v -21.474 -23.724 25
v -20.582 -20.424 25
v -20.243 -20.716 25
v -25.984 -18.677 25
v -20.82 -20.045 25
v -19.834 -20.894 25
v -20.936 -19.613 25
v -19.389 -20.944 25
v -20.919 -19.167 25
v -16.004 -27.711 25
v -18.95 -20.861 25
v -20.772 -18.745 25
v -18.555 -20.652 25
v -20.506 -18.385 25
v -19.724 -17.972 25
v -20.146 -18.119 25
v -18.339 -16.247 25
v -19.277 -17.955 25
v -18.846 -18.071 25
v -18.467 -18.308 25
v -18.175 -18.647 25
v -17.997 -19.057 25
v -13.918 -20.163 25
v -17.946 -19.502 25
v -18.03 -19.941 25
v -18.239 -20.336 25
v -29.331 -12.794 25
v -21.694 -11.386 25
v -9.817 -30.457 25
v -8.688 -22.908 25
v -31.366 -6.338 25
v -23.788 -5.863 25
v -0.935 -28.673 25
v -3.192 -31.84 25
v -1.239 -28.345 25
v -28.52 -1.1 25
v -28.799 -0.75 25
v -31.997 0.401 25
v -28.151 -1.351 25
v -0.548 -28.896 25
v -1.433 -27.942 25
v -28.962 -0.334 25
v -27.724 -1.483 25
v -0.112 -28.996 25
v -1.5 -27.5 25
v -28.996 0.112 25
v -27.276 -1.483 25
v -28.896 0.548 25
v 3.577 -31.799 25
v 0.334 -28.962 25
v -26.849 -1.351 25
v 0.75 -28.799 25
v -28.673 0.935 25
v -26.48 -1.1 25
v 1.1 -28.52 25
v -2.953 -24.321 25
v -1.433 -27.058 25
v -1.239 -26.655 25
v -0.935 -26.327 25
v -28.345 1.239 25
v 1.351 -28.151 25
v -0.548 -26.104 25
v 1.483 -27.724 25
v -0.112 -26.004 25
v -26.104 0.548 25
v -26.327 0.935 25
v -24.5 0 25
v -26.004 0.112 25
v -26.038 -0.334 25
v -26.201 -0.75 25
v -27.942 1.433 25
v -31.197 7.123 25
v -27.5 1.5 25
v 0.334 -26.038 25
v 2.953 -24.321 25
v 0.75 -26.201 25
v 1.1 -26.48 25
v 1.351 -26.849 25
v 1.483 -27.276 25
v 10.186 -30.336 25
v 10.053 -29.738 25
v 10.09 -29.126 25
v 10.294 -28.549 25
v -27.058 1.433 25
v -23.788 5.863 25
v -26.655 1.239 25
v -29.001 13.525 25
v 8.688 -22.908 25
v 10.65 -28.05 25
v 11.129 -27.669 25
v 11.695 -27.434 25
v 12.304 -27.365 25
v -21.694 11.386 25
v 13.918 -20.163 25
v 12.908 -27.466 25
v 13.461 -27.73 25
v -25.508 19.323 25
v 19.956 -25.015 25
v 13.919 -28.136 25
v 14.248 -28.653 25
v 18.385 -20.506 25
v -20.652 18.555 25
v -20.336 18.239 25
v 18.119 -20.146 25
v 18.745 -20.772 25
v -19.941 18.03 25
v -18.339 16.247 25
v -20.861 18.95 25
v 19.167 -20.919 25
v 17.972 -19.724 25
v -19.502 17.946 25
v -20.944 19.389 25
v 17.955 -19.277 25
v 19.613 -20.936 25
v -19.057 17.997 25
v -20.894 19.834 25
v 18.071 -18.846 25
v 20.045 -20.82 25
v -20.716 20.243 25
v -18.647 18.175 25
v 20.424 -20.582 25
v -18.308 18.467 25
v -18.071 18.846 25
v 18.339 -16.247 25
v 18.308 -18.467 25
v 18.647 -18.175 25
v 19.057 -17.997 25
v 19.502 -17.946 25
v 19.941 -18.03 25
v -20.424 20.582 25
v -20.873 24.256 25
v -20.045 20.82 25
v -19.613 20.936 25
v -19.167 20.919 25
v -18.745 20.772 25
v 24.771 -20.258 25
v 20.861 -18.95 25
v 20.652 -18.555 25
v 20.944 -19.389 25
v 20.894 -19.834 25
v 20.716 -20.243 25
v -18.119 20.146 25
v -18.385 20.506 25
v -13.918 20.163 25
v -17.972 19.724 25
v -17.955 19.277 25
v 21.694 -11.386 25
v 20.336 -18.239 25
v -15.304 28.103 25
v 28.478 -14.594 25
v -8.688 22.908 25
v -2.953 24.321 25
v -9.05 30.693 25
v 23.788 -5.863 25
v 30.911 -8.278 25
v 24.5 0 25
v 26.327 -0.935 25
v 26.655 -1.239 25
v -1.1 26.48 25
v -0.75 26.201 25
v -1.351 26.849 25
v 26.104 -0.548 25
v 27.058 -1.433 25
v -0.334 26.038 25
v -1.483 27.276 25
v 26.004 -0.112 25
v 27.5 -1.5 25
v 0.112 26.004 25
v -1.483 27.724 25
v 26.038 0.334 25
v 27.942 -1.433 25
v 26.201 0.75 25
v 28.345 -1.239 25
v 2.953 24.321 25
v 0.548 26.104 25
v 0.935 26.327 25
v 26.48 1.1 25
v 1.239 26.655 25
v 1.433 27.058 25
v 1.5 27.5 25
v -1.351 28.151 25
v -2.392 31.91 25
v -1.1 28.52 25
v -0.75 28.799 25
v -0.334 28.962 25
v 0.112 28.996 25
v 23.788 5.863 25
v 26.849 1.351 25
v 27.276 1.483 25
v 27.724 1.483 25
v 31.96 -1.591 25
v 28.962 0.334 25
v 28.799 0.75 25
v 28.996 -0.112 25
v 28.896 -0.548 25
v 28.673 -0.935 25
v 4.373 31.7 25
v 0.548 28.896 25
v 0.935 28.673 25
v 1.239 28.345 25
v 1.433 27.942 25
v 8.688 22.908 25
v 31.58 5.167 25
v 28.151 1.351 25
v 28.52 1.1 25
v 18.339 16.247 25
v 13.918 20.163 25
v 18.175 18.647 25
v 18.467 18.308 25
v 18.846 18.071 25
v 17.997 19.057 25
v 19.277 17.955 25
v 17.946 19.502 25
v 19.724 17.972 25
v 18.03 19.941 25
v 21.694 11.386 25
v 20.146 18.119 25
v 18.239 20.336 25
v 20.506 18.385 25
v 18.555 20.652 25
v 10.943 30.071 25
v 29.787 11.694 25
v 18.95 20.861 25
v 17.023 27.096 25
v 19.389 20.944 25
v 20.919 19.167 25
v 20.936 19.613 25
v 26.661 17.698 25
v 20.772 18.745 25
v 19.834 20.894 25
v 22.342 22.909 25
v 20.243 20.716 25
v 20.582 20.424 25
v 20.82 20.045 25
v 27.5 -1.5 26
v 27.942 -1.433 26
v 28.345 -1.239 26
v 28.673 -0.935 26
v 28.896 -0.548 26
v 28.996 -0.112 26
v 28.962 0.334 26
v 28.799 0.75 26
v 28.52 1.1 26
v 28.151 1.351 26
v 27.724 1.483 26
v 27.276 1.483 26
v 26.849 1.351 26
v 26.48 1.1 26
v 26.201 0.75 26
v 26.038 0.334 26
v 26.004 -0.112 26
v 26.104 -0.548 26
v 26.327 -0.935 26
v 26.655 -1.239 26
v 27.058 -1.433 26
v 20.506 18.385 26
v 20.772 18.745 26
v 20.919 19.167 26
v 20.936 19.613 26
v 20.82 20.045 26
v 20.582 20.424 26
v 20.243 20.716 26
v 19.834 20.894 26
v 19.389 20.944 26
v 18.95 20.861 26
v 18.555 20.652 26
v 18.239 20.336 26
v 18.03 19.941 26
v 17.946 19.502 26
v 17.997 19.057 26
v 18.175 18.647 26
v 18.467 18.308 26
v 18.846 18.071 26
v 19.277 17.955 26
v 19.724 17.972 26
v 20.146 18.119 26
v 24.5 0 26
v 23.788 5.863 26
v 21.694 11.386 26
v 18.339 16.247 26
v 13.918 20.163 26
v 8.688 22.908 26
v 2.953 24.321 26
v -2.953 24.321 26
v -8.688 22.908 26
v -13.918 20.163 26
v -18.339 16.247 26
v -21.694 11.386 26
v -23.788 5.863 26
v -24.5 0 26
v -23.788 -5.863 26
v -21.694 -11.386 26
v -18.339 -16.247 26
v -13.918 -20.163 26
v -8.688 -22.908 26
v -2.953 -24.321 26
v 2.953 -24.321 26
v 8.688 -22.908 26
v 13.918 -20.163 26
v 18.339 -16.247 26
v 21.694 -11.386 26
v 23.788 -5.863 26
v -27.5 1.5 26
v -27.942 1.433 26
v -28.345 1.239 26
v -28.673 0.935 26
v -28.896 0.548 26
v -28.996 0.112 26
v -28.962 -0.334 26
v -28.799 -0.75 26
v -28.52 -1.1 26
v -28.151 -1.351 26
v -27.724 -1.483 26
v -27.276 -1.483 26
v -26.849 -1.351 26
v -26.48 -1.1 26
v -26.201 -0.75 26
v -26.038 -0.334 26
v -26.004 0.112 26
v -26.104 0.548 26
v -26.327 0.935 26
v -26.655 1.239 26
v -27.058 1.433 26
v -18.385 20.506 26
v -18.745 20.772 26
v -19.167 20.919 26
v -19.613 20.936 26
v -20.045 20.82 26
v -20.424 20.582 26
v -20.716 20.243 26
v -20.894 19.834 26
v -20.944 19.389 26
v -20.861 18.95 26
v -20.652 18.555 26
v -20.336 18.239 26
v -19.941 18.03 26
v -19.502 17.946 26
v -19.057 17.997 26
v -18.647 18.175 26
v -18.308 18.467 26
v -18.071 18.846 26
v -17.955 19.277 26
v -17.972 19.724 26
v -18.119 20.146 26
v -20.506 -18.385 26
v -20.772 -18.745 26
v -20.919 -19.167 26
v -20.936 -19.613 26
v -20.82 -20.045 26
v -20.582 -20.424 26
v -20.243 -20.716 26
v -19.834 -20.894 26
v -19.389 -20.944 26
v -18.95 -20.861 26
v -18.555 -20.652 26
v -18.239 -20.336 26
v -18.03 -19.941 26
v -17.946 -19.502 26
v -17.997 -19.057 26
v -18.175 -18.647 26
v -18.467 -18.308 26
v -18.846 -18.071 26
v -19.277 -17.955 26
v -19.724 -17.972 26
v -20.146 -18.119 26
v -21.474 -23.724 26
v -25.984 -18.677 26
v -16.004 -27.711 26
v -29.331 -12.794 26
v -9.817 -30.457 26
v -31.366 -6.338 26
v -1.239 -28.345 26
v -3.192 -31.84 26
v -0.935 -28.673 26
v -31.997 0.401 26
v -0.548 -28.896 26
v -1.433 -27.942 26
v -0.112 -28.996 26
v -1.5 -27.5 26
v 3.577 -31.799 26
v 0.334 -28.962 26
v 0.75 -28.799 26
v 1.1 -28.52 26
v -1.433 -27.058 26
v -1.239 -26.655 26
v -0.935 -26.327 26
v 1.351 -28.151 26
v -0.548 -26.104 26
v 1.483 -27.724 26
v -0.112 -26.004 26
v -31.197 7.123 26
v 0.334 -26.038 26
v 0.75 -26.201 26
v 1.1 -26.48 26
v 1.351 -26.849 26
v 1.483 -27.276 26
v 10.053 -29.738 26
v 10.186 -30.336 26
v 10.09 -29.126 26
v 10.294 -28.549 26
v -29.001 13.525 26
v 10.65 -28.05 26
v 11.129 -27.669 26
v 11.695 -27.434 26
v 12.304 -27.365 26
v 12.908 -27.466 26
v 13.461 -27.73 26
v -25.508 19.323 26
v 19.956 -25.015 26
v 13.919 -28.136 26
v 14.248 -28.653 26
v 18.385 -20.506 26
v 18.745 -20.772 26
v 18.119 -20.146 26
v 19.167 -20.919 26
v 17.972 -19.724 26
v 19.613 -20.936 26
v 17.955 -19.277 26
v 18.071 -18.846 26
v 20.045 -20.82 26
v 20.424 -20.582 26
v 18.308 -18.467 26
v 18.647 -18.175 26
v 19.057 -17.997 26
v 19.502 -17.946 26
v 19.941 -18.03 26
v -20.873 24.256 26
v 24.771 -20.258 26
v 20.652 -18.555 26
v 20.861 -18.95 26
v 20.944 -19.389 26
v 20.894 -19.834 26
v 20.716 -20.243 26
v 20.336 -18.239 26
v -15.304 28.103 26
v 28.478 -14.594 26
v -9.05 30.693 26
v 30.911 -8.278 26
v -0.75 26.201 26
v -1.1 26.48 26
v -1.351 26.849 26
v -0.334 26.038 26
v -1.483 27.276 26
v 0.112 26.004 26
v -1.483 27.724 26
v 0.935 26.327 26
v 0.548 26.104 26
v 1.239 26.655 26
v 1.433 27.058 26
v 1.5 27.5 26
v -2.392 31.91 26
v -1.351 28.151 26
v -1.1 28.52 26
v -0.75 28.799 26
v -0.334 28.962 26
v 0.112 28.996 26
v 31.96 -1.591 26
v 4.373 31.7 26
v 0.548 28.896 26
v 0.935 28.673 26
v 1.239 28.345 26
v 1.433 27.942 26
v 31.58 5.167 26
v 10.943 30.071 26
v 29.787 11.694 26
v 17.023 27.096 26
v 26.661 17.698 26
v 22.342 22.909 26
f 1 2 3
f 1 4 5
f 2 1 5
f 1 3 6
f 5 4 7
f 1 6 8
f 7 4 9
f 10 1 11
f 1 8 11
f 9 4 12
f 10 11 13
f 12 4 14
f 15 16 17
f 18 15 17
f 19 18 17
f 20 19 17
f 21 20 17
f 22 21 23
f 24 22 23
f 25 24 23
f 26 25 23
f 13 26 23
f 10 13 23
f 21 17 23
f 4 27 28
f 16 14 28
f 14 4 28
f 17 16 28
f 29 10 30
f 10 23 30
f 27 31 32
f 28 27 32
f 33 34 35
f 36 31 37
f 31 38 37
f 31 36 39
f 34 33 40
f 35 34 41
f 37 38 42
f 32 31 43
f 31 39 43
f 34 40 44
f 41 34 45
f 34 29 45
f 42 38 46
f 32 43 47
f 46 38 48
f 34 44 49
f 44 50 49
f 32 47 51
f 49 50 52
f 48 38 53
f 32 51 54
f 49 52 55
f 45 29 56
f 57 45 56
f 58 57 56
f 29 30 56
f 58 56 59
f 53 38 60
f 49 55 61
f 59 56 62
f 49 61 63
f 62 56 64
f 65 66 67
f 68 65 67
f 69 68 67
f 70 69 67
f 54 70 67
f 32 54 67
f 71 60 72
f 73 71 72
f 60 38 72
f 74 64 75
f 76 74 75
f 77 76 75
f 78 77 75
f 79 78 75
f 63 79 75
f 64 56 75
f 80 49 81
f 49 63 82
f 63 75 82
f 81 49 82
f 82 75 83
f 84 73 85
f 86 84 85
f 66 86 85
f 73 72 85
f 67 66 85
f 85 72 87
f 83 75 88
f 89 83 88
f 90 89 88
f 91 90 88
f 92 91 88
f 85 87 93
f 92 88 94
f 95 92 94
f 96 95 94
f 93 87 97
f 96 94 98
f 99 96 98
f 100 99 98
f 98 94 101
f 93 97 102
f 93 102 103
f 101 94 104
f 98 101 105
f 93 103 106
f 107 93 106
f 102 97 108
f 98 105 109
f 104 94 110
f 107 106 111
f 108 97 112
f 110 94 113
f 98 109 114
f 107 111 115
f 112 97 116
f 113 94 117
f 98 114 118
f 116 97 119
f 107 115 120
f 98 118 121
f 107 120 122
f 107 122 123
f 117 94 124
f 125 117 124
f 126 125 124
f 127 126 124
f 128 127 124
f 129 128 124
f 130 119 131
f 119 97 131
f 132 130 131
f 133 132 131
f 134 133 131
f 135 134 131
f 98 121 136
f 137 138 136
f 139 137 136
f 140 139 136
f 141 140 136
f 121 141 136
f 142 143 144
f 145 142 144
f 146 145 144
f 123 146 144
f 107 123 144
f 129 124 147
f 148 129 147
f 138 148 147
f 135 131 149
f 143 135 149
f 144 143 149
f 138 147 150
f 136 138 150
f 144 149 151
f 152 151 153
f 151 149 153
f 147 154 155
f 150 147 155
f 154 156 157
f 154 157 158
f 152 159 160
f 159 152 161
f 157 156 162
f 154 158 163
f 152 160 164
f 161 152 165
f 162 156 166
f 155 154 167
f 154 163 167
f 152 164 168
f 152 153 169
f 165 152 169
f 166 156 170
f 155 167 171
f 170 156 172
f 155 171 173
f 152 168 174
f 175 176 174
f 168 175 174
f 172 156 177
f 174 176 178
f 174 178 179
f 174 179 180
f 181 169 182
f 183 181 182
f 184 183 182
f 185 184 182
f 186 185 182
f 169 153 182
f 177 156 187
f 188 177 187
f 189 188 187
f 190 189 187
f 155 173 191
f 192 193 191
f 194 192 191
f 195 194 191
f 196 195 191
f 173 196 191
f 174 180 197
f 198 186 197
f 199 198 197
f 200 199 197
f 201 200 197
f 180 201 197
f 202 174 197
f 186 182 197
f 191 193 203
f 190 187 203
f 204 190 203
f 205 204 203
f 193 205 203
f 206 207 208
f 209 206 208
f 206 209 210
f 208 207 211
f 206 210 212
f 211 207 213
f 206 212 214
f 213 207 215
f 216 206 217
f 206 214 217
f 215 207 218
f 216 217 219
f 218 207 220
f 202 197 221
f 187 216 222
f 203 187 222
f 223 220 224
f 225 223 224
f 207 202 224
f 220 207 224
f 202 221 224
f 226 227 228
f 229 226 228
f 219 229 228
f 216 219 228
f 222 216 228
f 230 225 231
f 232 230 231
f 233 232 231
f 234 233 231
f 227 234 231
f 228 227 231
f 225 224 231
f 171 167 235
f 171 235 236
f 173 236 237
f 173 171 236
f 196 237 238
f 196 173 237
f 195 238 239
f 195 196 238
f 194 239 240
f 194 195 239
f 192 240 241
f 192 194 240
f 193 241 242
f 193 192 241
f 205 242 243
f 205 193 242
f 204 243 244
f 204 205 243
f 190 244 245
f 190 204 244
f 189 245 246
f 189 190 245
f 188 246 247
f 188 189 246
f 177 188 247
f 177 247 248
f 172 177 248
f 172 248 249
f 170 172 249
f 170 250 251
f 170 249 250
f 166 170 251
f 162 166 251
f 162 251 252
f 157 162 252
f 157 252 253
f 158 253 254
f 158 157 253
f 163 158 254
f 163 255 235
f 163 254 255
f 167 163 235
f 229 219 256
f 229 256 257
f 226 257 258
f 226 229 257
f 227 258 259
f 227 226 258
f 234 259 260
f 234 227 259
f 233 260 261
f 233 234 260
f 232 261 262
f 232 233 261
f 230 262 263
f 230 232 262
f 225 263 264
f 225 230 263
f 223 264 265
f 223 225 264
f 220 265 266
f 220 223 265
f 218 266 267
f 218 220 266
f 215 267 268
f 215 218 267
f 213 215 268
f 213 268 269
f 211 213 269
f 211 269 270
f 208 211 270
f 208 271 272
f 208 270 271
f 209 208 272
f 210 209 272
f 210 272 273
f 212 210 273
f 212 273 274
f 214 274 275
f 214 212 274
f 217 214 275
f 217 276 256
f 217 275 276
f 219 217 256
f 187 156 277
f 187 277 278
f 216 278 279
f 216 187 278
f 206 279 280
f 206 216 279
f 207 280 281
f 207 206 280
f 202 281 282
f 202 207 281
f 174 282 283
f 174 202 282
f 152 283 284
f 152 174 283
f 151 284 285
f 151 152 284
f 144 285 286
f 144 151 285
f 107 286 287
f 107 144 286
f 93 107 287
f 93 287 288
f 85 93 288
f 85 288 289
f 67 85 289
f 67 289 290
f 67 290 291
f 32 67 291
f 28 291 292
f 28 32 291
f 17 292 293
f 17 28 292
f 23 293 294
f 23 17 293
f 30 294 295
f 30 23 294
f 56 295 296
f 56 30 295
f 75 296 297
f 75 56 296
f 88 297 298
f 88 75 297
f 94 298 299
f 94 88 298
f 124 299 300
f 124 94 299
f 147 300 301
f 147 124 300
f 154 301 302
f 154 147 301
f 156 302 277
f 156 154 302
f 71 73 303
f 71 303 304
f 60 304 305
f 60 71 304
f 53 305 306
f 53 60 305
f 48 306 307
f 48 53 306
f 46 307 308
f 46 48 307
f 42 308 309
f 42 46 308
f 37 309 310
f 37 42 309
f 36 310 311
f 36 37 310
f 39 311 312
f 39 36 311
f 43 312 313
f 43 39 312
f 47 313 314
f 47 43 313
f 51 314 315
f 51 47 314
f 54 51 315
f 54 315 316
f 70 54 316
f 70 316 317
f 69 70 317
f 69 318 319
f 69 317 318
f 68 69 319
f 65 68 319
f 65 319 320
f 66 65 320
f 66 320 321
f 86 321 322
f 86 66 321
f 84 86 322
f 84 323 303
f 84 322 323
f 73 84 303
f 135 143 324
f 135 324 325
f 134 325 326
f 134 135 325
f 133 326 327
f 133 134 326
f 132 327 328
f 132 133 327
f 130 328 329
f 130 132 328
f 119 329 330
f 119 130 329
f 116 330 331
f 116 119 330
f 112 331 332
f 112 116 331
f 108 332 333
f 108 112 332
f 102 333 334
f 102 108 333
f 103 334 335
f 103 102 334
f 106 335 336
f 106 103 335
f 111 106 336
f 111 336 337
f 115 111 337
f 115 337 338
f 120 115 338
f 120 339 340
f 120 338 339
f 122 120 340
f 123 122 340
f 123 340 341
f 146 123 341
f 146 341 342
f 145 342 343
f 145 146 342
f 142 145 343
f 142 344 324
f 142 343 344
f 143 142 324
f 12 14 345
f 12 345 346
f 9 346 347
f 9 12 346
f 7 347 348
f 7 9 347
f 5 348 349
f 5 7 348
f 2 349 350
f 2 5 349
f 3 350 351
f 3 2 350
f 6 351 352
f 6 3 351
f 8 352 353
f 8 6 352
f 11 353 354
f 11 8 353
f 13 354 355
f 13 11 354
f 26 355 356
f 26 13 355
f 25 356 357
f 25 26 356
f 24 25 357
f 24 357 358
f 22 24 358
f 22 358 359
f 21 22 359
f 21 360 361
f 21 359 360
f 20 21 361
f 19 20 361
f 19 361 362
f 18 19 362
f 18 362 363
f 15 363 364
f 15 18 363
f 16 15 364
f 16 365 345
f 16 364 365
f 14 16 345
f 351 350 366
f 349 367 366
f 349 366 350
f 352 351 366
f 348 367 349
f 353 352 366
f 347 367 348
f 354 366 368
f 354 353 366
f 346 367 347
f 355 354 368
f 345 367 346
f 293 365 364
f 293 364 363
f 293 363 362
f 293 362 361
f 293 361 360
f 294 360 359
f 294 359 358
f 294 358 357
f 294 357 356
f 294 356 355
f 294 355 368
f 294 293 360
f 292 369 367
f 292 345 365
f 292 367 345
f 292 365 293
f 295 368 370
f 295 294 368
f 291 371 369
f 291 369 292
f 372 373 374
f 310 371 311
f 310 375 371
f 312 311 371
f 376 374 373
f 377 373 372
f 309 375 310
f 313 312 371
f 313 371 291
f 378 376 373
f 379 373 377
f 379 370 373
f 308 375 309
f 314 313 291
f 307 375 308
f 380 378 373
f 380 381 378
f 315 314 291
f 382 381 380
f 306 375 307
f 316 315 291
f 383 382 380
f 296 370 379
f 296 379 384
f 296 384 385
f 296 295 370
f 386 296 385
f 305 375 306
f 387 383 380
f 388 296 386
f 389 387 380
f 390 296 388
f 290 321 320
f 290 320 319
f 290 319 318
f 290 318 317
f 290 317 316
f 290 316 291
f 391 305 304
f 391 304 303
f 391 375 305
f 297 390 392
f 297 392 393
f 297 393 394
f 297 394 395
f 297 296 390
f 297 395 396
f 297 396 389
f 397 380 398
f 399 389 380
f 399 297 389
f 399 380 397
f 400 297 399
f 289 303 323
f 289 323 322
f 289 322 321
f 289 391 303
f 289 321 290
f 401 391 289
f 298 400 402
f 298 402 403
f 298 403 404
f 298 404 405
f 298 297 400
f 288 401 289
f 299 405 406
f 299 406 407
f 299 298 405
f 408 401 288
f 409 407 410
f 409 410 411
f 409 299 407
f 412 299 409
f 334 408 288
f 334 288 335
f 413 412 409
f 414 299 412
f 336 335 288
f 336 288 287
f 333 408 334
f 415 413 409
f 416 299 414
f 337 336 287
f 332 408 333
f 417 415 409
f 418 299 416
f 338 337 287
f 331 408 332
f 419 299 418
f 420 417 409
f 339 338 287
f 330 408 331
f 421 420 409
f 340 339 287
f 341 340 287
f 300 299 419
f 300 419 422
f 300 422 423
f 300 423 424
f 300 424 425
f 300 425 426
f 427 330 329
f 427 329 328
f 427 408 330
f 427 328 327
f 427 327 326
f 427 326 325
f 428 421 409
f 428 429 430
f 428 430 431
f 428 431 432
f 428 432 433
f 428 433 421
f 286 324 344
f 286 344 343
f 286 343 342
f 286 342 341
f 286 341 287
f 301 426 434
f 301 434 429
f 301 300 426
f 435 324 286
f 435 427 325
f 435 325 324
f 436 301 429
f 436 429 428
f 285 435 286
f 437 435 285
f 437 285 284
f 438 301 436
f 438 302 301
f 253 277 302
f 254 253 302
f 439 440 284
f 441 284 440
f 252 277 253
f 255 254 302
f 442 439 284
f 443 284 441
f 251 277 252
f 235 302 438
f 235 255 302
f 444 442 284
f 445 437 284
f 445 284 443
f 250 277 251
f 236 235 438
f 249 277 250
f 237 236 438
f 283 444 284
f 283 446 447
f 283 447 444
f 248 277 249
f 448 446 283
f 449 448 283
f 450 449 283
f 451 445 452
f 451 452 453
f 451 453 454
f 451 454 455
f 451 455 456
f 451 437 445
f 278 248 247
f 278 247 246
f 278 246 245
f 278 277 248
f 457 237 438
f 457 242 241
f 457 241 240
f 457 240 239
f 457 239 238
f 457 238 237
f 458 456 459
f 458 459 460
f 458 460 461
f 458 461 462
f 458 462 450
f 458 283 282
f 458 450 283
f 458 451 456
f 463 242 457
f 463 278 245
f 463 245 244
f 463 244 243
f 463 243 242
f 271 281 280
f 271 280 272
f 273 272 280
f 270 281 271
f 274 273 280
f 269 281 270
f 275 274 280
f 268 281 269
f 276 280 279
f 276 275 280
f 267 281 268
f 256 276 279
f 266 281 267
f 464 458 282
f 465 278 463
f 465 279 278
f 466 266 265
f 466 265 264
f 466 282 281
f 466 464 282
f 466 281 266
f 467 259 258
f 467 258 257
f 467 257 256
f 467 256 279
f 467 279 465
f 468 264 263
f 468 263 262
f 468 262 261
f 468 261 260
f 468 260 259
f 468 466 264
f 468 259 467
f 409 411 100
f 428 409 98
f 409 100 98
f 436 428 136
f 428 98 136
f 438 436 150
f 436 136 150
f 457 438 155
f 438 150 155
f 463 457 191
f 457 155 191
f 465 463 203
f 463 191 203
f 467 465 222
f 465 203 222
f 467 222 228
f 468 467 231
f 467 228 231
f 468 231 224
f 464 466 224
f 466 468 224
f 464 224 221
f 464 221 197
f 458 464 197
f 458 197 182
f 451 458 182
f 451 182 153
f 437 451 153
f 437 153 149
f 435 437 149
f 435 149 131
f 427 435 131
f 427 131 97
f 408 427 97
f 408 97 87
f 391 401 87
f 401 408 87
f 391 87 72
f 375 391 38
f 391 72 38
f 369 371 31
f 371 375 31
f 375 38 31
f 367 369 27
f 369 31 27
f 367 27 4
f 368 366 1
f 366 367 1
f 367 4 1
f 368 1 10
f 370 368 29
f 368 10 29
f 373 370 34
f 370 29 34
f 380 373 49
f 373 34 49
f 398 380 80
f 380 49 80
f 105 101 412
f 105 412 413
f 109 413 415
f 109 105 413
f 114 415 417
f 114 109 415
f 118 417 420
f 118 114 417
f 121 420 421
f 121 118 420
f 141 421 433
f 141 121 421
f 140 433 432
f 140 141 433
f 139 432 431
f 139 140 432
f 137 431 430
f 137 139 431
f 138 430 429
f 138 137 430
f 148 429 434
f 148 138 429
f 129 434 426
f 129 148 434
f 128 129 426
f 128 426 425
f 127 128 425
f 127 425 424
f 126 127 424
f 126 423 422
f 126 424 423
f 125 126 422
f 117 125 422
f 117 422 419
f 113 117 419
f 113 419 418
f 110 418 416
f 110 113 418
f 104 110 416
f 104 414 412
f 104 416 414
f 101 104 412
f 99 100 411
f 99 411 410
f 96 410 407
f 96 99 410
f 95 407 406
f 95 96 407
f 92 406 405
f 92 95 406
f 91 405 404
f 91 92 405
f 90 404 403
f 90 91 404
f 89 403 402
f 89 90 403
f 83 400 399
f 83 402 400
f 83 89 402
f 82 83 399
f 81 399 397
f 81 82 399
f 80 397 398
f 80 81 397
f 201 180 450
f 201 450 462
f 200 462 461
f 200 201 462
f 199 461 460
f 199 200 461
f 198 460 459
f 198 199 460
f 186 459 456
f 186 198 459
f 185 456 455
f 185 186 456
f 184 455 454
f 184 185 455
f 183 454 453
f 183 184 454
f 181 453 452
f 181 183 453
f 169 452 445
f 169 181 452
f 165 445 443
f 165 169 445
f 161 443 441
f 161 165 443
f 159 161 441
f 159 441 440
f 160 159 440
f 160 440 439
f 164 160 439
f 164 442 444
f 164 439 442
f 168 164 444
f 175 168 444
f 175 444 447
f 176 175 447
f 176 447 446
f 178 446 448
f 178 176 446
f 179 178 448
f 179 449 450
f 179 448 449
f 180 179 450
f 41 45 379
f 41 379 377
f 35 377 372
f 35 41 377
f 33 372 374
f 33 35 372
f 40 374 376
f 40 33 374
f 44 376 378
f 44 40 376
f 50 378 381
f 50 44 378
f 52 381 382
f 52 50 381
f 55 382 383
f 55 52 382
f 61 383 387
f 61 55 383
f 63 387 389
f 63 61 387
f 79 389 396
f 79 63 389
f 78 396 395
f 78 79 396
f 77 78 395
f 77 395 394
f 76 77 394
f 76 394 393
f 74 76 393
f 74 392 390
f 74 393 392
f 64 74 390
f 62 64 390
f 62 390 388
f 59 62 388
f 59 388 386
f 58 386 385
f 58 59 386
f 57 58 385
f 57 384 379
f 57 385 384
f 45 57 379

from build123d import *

# Parameters (mm, degrees)
CYLINDER1301_R               = 1.5
CYLINDER1301_DEPTH           = 20
CYLINDER1301_PLACEMENT_ANGLE = 45
CYLINDER1300_R               = 1.5
CYLINDER1300_DEPTH           = 20
CYLINDER1296_R               = 1.5
CYLINDER1296_DEPTH           = 20
CYLINDER1296_PLACEMENT_ANGLE = 135
CYLINDER1298_R               = 1.5
CYLINDER1298_DEPTH           = 20
CYLINDER1302_R               = 1.5
CYLINDER1302_DEPTH           = 20
CYLINDER1299_R               = 1.5
CYLINDER1299_DEPTH           = 20
CYLINDER1299_PLACEMENT_ANGLE = 225
CYLINDER1297_R               = 1.5
CYLINDER1297_DEPTH           = 20
CYLINDER1297_PLACEMENT_ANGLE = 45
CYLINDER1295_R               = 1.5
CYLINDER1295_DEPTH           = 20
CYLINDER1306_R               = 2.2
CYLINDER1306_DEPTH           = 15
CYLINDER1306_PLACEMENT_ANGLE = 22.5
TUBE054_R                    = 32
TUBE054_R_2                  = 24.5
TUBE054_DEPTH                = 1


with BuildPart() as v_lec1301:
    # Cylinder1301 → Cylinder1301 (new body)
    with BuildSketch(Plane.XY):
        Circle(CYLINDER1301_R)
    extrude(amount=CYLINDER1301_DEPTH)


with BuildPart() as v_lec1301_1:
    # Cylinder1301 placement: moved
    add(v_lec1301.part.moved(Location((-19.445436, 19.445436, 10))).rotate(Axis((-19.445436, 19.445436, 10), (0, 0, 1)), CYLINDER1301_PLACEMENT_ANGLE))


with BuildPart() as v_lec1300:
    # Cylinder1300 → Cylinder1300 (new body)
    with BuildSketch(Plane(origin=(-27.5, 0, 10), x_dir=(0, 1, 0), z_dir=(0, 0, 1))):
        Circle(CYLINDER1300_R)
    extrude(amount=CYLINDER1300_DEPTH)


with BuildPart() as v_lec1296:
    # Cylinder1296 → Cylinder1296 (new body)
    with BuildSketch(Plane.XY):
        Circle(CYLINDER1296_R)
    extrude(amount=CYLINDER1296_DEPTH)


with BuildPart() as v_lec1296_1:
    # Cylinder1296 placement: moved
    add(v_lec1296.part.moved(Location((-19.445436, -19.445436, 10))).rotate(Axis((-19.445436, -19.445436, 10), (0, 0, 1)), CYLINDER1296_PLACEMENT_ANGLE))


with BuildPart() as v_lec1298:
    # Cylinder1298 → Cylinder1298 (new body)
    with BuildSketch(Plane(origin=(0, -27.5, 10), x_dir=(-1, 0, 0), z_dir=(0, 0, 1))):
        Circle(CYLINDER1298_R)
    extrude(amount=CYLINDER1298_DEPTH)


with BuildPart() as v_lec1302:
    # Cylinder1302 → Cylinder1302 (new body)
    with BuildSketch(Plane(origin=(27.5, 0, 10), x_dir=(0, -1, 0), z_dir=(0, 0, 1))):
        Circle(CYLINDER1302_R)
    extrude(amount=CYLINDER1302_DEPTH)


with BuildPart() as v_lec1299:
    # Cylinder1299 → Cylinder1299 (new body)
    with BuildSketch(Plane.XY):
        Circle(CYLINDER1299_R)
    extrude(amount=CYLINDER1299_DEPTH)


with BuildPart() as v_lec1299_1:
    # Cylinder1299 placement: moved
    add(v_lec1299.part.moved(Location((19.445436, -19.445436, 10))).rotate(Axis((19.445436, -19.445436, 10), (0, 0, 1)), CYLINDER1299_PLACEMENT_ANGLE))


with BuildPart() as v_lec1297:
    # Cylinder1297 → Cylinder1297 (new body)
    with BuildSketch(Plane.XY):
        Circle(CYLINDER1297_R)
    extrude(amount=CYLINDER1297_DEPTH)


with BuildPart() as v_lec1297_1:
    # Cylinder1297 placement: moved
    add(v_lec1297.part.moved(Location((19.445436, 19.445436, 10))).rotate(Axis((19.445436, 19.445436, 10), (0, 0, -1)), CYLINDER1297_PLACEMENT_ANGLE))


with BuildPart() as compound:
    # Cylinder1295 → Cylinder1295 (new body)
    with BuildSketch(Plane(origin=(0, 27.5, 10), x_dir=(1, 0, 0), z_dir=(0, 0, 1))):
        Circle(CYLINDER1295_R)
    extrude(amount=CYLINDER1295_DEPTH)

    # Compound: union Válec1301, Válec1300, Válec1296, Válec1298, Válec1302, Válec1299, Válec1297
    add(v_lec1301_1.part)
    add(v_lec1300.part)
    add(v_lec1296_1.part)
    add(v_lec1298.part)
    add(v_lec1302.part)
    add(v_lec1299_1.part)
    add(v_lec1297_1.part)


with BuildPart() as v_lec1306:
    # Cylinder1306 → Cylinder1306 (new body)
    with BuildSketch(Plane.XY):
        Circle(CYLINDER1306_R)
    extrude(amount=CYLINDER1306_DEPTH)


with BuildPart() as v_lec1306_1:
    # Cylinder1306 placement: moved
    add(v_lec1306.part.moved(Location((12.24587, -29.564145, 20))).rotate(Axis((12.24587, -29.564145, 20), (0, 0, 1)), CYLINDER1306_PLACEMENT_ANGLE))


with BuildPart() as cut492:
    # Tube054 → Tube054 (new body)
    with BuildSketch(Plane.XY.offset(25)):
        Circle(TUBE054_R)
        Circle(TUBE054_R_2, mode=Mode.SUBTRACT)
    extrude(amount=TUBE054_DEPTH)

    # Cut497: cut Válec1306
    add(v_lec1306_1.part, mode=Mode.SUBTRACT)

    # Cut492: cut Compound
    add(compound.part, mode=Mode.SUBTRACT)


solid = cut492.part
